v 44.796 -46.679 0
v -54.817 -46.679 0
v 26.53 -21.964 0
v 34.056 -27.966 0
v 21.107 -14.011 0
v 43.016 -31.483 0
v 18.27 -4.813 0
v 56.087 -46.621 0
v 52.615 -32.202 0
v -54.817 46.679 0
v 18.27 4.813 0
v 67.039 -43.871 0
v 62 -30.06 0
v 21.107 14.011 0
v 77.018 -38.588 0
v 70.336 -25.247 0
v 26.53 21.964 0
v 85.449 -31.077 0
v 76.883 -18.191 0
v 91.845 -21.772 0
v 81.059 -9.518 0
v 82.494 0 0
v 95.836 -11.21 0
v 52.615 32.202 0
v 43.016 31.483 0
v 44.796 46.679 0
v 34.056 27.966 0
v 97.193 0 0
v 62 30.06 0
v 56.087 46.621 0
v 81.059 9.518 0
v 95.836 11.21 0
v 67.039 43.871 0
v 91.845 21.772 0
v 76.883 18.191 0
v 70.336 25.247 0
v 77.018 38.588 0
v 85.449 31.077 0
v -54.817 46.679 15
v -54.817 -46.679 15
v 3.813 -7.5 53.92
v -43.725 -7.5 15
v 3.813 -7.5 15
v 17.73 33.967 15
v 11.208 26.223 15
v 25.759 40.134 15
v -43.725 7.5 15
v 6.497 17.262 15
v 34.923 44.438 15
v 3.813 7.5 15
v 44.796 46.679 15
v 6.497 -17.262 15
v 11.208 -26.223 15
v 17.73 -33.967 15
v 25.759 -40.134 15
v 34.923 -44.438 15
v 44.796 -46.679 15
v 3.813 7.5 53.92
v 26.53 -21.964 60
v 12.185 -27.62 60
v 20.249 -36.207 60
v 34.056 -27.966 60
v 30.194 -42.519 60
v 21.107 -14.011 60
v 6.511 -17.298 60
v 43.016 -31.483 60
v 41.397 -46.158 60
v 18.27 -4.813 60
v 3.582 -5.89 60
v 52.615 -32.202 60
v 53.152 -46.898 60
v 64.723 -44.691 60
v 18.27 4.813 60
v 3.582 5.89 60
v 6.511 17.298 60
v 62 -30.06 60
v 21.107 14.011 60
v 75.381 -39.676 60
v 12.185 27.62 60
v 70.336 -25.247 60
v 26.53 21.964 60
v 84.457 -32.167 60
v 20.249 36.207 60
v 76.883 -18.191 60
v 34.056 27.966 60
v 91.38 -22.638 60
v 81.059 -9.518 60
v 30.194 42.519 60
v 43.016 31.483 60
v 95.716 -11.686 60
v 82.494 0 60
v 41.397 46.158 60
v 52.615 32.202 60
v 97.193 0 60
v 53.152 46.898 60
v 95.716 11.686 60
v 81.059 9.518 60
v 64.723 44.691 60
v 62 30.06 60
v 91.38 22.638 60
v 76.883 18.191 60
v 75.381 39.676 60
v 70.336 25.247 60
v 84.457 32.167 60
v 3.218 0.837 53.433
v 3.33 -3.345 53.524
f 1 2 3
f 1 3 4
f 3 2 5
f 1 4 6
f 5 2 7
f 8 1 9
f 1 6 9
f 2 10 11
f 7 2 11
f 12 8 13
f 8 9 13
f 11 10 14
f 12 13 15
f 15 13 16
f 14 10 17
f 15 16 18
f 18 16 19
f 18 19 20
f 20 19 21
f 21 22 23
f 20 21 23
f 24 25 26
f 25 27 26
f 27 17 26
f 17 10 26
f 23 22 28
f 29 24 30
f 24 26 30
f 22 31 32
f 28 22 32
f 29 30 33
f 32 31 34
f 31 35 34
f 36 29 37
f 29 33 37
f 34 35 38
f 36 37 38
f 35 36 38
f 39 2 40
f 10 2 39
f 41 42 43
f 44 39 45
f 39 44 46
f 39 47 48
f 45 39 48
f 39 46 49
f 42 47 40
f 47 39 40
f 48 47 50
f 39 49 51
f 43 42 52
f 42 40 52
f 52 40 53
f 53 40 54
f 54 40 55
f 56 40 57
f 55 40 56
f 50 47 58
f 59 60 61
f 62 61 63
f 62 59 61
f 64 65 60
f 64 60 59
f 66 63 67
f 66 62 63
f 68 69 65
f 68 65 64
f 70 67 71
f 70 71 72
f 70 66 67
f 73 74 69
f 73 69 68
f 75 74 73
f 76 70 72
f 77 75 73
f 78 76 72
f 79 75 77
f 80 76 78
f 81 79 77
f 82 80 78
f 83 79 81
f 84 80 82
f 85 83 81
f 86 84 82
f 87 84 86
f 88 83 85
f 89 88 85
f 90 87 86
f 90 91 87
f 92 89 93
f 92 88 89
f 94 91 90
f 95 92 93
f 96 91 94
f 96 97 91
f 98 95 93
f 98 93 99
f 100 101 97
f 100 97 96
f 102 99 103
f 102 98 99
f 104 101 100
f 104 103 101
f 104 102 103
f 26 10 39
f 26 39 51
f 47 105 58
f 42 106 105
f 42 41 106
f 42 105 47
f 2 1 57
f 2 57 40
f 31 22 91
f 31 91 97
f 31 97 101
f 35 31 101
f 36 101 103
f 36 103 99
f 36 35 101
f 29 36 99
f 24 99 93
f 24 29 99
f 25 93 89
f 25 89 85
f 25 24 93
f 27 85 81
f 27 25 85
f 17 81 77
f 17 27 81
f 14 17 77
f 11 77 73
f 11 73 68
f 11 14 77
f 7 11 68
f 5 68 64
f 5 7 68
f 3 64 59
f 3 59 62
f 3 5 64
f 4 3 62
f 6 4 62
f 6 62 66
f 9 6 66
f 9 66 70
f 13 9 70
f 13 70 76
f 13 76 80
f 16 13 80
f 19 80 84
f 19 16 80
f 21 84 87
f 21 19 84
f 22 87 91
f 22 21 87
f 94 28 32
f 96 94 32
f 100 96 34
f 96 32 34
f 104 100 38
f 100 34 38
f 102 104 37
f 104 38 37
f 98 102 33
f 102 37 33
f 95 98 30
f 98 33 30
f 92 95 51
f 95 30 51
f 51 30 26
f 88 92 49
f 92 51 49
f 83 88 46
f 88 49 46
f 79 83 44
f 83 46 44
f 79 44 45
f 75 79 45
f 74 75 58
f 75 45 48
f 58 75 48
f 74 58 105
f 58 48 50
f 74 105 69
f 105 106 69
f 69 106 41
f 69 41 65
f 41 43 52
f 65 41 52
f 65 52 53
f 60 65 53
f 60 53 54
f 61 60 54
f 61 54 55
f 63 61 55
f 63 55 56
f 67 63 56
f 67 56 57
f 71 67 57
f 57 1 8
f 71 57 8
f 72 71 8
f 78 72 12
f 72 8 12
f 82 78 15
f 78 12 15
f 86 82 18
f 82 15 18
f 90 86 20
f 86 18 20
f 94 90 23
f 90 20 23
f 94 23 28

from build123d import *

# Parameters (mm, degrees)
F0_R     = 46.9907893429
F0_R_2   = 32.2922795361
F1_DEPTH = 60
F3_DEPTH = 15
F5_DEPTH = 7.5


with BuildPart() as f1:
    # F0 (on Top) → F1 (new body)
    with BuildSketch(Plane.XY):
        with Locations((50.2018332481, 0)):
            Circle(F0_R)
        with Locations((50.2018332481, 0)):
            Circle(F0_R_2, mode=Mode.SUBTRACT)
    extrude(amount=F1_DEPTH)

    # F2 (on face) → F3 (join)
    with BuildSketch(Plane(origin=(0, 0, 0), x_dir=(1, 0, 0), z_dir=(0, 0, -1))):
        with BuildLine():
            ThreePointArc((44.7961655187, -46.6788286), (3.2110439053, 0), (44.7961655187, 46.6788286))
            Line((44.7961655187, 46.6788286), (-54.8171773669, 46.6788286))
            Line((-54.8171773669, 46.6788286), (-54.8171773669, -46.6788286))
            Line((-54.8171773669, -46.6788286), (44.7961655187, -46.6788286))
        make_face()
    extrude(amount=-F3_DEPTH)

    # F4 (on Front) → F5 (join, symmetric)
    with BuildSketch(Plane.XZ):
        Polygon((4.0778061375, 54.1363731027), (-44.1848946292, 14.6238496527), (4.0778061375, 14.6238496527), align=None)
    extrude(amount=F5_DEPTH, both=True)


solid = f1.part
